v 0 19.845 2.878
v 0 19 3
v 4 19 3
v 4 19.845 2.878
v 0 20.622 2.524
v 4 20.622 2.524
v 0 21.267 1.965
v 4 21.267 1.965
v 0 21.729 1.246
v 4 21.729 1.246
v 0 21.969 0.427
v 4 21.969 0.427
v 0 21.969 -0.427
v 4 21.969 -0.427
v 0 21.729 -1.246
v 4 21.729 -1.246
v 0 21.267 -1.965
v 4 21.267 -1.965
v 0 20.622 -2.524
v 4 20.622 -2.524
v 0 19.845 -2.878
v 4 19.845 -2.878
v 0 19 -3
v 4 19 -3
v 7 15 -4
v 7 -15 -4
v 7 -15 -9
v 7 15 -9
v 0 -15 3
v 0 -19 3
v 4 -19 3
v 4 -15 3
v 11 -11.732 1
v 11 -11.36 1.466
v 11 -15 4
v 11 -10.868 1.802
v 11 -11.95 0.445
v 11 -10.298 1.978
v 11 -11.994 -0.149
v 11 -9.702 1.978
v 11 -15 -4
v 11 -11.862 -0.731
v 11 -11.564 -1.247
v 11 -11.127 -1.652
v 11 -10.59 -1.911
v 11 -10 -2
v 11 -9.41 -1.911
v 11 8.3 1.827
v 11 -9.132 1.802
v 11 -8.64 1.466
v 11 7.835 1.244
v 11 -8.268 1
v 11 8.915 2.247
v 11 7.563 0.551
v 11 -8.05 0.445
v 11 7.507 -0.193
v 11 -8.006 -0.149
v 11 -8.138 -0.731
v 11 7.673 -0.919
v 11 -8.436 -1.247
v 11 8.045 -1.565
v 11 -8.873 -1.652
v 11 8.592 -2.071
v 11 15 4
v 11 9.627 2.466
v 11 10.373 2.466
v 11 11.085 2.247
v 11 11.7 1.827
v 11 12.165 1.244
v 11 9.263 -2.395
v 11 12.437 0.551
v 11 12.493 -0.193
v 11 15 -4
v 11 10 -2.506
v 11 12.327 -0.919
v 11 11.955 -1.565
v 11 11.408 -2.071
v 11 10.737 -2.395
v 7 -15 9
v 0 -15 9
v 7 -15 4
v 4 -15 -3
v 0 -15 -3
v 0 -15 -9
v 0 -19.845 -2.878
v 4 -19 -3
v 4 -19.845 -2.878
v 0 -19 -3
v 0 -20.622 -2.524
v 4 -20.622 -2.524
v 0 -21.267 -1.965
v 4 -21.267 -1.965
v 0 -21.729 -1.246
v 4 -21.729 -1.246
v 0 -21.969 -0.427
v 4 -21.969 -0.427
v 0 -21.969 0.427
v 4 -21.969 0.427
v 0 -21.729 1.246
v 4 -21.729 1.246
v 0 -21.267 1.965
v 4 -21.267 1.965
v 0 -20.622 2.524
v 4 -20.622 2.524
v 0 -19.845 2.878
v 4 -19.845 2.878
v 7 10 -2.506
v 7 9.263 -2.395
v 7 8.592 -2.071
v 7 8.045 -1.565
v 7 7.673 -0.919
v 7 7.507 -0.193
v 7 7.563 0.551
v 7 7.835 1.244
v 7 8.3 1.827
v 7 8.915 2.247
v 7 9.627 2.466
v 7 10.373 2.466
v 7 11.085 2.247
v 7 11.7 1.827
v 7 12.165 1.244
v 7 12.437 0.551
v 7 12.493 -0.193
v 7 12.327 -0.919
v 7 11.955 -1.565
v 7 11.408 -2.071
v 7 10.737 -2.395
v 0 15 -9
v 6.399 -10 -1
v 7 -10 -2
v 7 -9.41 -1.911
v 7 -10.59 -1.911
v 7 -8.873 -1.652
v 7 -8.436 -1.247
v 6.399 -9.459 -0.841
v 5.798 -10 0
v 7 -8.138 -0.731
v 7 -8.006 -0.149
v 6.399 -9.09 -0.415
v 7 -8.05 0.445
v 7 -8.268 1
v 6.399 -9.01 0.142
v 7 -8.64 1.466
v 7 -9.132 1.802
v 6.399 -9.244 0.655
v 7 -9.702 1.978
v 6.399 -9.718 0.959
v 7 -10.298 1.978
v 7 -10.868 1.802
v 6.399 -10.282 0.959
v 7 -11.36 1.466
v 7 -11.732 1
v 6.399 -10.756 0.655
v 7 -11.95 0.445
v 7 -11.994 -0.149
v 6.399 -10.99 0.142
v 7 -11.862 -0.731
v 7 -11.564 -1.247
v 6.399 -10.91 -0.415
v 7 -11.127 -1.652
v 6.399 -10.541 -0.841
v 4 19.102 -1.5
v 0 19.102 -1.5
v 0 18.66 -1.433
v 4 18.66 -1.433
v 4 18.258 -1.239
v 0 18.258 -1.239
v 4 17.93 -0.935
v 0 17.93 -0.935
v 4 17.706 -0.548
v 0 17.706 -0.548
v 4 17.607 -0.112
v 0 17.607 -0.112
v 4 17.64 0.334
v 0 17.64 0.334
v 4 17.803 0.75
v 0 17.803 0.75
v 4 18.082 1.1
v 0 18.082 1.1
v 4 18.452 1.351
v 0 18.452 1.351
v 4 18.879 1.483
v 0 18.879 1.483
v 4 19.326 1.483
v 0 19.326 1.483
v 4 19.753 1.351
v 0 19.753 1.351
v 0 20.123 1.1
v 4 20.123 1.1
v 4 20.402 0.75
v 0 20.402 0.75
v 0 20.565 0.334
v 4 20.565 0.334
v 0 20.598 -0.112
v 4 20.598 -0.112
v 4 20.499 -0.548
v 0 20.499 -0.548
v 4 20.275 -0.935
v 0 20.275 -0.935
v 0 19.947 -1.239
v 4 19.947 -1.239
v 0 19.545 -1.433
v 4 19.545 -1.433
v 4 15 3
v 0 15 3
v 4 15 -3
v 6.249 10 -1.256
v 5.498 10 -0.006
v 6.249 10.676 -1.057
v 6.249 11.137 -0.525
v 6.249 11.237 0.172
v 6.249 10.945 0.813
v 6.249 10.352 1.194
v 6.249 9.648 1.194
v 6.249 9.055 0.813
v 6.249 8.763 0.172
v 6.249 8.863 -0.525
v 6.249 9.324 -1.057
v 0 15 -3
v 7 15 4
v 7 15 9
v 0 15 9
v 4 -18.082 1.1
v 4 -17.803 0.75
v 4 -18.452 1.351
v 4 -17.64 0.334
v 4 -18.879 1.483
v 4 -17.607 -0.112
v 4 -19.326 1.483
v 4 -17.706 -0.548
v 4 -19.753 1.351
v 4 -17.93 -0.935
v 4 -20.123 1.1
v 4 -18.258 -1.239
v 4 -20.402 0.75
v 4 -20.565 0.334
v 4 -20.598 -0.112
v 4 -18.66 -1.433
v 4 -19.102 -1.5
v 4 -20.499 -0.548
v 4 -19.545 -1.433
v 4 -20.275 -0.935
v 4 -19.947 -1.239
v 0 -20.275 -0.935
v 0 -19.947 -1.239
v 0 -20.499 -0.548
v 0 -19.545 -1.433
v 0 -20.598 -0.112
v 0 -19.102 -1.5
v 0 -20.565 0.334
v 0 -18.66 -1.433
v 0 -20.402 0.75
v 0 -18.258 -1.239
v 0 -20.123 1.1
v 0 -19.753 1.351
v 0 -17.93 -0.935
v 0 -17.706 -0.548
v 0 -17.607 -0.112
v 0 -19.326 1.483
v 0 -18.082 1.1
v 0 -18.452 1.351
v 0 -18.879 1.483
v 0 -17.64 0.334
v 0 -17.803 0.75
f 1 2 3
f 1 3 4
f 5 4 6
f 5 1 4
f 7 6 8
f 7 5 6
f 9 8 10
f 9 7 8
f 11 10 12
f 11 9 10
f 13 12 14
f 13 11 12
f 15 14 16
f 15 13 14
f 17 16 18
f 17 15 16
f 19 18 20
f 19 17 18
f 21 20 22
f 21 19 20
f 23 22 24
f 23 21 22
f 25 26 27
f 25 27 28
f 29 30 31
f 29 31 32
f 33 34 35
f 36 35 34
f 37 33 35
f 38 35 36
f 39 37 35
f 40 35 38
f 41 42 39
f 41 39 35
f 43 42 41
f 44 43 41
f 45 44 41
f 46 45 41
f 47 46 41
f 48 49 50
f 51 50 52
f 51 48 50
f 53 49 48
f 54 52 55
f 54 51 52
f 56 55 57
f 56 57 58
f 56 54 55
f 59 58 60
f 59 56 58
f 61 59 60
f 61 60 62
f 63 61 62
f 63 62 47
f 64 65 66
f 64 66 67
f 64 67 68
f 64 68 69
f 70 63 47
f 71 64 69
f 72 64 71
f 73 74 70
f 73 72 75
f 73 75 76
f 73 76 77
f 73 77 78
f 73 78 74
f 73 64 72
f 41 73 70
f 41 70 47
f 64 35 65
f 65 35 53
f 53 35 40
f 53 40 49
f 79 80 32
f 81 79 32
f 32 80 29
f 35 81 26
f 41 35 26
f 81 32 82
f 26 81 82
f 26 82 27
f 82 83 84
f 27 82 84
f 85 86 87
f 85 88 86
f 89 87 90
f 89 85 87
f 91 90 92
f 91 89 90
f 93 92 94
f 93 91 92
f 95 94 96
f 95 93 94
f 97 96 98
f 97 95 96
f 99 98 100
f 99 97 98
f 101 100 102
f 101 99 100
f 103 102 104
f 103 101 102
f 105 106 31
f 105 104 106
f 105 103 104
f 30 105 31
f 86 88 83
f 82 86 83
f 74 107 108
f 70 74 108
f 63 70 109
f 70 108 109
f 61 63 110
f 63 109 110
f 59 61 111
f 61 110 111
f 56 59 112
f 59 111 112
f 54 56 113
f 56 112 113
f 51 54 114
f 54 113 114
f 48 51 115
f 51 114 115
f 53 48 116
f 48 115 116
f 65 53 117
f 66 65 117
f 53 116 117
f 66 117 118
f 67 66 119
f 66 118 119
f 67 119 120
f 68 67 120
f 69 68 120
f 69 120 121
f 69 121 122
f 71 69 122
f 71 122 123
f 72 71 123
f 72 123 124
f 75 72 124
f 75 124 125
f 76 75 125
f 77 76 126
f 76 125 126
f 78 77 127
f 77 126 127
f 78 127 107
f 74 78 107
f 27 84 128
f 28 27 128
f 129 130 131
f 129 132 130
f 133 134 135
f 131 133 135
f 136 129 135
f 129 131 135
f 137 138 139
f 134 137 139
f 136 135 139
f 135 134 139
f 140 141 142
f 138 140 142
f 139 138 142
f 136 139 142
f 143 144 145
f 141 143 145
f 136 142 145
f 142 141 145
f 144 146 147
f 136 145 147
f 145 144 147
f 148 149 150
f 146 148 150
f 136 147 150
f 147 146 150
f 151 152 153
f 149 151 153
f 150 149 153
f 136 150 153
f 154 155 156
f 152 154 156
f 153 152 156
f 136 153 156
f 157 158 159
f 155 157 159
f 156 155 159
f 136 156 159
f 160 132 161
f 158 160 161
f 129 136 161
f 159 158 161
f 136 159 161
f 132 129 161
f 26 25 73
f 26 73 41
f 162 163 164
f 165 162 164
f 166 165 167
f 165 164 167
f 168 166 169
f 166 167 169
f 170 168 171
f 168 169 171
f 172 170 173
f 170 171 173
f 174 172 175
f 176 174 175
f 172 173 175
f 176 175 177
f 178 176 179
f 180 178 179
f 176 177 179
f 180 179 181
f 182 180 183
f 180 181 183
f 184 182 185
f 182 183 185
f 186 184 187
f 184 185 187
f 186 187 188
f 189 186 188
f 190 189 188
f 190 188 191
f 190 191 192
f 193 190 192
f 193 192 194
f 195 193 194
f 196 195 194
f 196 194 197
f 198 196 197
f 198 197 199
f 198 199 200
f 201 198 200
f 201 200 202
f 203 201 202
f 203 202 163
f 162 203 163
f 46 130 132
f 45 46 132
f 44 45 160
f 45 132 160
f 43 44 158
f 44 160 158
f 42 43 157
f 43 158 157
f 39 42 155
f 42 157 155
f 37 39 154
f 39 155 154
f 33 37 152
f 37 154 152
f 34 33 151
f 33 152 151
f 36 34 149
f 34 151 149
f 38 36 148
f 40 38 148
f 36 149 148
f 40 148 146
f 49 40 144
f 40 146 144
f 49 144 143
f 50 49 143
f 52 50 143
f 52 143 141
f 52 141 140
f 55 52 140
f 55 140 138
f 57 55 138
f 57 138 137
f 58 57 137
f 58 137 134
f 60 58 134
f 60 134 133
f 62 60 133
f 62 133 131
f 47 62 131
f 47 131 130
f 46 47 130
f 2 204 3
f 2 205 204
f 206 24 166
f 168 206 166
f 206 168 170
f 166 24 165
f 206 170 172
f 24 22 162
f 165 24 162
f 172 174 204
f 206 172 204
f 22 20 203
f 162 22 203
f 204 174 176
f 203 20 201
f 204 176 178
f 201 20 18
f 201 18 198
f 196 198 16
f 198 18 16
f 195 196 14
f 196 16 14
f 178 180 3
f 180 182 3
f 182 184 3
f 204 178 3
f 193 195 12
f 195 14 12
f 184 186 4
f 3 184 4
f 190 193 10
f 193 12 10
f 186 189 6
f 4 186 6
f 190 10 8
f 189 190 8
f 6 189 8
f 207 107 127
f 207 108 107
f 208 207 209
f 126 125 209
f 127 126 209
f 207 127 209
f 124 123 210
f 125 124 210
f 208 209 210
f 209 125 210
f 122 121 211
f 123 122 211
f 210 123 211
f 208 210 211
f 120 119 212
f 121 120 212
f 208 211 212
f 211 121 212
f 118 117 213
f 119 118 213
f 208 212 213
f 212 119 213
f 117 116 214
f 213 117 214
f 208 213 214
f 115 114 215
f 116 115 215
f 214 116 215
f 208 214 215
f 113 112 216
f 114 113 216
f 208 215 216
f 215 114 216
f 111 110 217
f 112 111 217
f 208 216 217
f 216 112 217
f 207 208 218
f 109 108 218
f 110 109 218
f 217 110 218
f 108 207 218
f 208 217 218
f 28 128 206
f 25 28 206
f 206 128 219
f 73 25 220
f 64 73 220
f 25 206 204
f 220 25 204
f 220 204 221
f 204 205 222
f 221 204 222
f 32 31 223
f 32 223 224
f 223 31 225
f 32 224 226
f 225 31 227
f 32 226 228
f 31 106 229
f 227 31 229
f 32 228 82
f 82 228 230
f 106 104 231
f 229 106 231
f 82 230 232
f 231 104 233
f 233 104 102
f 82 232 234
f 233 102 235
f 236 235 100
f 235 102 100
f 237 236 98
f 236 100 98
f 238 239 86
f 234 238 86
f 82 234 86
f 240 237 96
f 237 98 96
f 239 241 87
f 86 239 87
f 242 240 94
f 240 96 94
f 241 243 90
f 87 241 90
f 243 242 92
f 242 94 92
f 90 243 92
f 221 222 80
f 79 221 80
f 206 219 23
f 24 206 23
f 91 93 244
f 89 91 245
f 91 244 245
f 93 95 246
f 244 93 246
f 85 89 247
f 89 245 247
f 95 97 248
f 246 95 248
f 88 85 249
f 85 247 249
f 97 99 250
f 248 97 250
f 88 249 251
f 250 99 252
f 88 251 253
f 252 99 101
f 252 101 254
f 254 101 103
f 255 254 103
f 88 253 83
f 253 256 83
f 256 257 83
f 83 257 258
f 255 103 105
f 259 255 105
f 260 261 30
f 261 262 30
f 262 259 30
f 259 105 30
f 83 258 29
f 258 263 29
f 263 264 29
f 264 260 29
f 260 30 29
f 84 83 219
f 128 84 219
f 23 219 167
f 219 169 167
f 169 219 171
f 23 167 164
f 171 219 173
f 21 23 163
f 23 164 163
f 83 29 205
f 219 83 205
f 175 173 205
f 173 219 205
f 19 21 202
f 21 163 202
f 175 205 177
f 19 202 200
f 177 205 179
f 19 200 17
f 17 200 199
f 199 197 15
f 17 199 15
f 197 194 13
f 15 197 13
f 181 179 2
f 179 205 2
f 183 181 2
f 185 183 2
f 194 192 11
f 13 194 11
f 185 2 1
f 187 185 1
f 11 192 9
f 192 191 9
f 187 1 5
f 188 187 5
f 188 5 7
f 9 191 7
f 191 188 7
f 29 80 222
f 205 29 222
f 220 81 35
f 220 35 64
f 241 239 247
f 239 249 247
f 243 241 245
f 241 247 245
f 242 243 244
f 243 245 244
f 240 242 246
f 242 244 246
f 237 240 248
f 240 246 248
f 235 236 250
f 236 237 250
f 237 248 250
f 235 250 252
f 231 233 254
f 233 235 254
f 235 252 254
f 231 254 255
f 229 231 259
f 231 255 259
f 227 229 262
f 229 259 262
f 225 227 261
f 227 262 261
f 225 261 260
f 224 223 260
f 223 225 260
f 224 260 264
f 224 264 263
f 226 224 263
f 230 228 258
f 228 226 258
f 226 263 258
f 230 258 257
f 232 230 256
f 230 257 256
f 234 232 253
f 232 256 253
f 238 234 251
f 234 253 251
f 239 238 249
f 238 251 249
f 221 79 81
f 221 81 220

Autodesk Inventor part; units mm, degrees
ref_plane "YZ Plane" through (0, 0, 0) normal (1, 0, 0) x (0, 1, 0)
ref_plane "XZ Plane" through (0, 0, 0) normal (0, 1, 0) x (-1, 0, 0)
ref_plane "XY Plane" through (0, 0, 0) normal (0, 0, 1) x (1, 0, 0)
sketch "Skizze1" plane through (0, 0, 0) normal (1, 0, 0) x (0, 1, 0)
  line L0 (-15, -9) -> (15, -9)
  line L1 (15, -9) -> (15, 9)
  line L2 (15, 9) -> (-15, 9)
  line L3 (-15, 9) -> (-15, -9)
  line L4 (-15, -9) -> (15, 9) construction
  line L5 (15, -9) -> (-15, 9) construction
  point P0 (0, 0)
  dimension "d0" = 30
  dimension "d1" = 18
extrude "Extrusion1" add sketch "Skizze1" along normal blind 7
sketch "Skizze2" plane through (7, 0, 0) normal (1, 0, 0) x (0, 0, -1)
  line L0 (4, -15) -> (-4, -15)
  line L1 (-4, -15) -> (-4, 15)
  line L2 (-4, 15) -> (4, 15)
  line L3 (4, 15) -> (4, -15)
  line L4 (4, -15) -> (-4, 15) construction
  line L5 (-4, -15) -> (4, 15) construction
  point P0 (0, 0)
  dimension "d4" = 8
  dimension "d5" = 30
extrude "Extrusion2" add sketch "Skizze2" along normal blind 4
sketch "Skizze3" plane through (11, 0, 0) normal (1, 0, 0) x (0, 0, -1)
  point P0 (0, 0)
  point P1 (0.0058, 10)
  dimension "d24" = 10
hole "Bohrung1" at (11, 10, -0.0058) direction (-1, 0, 0) diameter 5 depth 4 tip angle 118
sketch "Skizze4" plane through (11, 0, 0) normal (1, 0, 0) x (0, 0, -1)
  line L0 (-4, -15) -> (4, -15) projected
  point P0 (0, 0)
  point P1 (0, -10)
  dimension "d22" = 0
  dimension "d23" = 5
hole "Bohrung2" at (11, -10, 0) direction (-1, 0, 0) diameter 4 depth 4 tip angle 118
sketch "Skizze5" plane through (0, 0, 0) normal (-1, 0, 0) x (0, 0, 1)
  line L0 (-9, 15) -> (9, 15) projected
  line L1 (-3, 15) -> (-3, 19)
  line L2 (-3, 15) -> (1, 15) construction
  line L3 (3, 15) -> (3, 19)
  line L4 (-3, 15) -> (3, 15)
  arc A0 (3, 19) -> (-3, 19) centre (0, 19) ccw
  point P0 (0, 0)
  point P1 (-3, 17)
  dimension "d25" = 4
  dimension "d26" = 90
  dimension "d27" = 3
  dimension "d28" = 3
extrude "Extrusion3" add sketch "Skizze5" against normal blind 4
sketch "Skizze6" plane through (4, 0, 0) normal (1, 0, 0) x (0, 0, -1)
  point P0 (0, 0)
  point P1 (0, 19.1025)
  dimension "d38" = 0
hole "Bohrung3" at (4, 19.1025, 0) direction (-1, 0, 0) diameter 3 depth 4 tip angle 118
mirror "Spiegeln1" about plane through (0, 0, 0) normal (0, 1, 0) of "Extrusion3", "Bohrung3"
properties part number "InfraSensor"
